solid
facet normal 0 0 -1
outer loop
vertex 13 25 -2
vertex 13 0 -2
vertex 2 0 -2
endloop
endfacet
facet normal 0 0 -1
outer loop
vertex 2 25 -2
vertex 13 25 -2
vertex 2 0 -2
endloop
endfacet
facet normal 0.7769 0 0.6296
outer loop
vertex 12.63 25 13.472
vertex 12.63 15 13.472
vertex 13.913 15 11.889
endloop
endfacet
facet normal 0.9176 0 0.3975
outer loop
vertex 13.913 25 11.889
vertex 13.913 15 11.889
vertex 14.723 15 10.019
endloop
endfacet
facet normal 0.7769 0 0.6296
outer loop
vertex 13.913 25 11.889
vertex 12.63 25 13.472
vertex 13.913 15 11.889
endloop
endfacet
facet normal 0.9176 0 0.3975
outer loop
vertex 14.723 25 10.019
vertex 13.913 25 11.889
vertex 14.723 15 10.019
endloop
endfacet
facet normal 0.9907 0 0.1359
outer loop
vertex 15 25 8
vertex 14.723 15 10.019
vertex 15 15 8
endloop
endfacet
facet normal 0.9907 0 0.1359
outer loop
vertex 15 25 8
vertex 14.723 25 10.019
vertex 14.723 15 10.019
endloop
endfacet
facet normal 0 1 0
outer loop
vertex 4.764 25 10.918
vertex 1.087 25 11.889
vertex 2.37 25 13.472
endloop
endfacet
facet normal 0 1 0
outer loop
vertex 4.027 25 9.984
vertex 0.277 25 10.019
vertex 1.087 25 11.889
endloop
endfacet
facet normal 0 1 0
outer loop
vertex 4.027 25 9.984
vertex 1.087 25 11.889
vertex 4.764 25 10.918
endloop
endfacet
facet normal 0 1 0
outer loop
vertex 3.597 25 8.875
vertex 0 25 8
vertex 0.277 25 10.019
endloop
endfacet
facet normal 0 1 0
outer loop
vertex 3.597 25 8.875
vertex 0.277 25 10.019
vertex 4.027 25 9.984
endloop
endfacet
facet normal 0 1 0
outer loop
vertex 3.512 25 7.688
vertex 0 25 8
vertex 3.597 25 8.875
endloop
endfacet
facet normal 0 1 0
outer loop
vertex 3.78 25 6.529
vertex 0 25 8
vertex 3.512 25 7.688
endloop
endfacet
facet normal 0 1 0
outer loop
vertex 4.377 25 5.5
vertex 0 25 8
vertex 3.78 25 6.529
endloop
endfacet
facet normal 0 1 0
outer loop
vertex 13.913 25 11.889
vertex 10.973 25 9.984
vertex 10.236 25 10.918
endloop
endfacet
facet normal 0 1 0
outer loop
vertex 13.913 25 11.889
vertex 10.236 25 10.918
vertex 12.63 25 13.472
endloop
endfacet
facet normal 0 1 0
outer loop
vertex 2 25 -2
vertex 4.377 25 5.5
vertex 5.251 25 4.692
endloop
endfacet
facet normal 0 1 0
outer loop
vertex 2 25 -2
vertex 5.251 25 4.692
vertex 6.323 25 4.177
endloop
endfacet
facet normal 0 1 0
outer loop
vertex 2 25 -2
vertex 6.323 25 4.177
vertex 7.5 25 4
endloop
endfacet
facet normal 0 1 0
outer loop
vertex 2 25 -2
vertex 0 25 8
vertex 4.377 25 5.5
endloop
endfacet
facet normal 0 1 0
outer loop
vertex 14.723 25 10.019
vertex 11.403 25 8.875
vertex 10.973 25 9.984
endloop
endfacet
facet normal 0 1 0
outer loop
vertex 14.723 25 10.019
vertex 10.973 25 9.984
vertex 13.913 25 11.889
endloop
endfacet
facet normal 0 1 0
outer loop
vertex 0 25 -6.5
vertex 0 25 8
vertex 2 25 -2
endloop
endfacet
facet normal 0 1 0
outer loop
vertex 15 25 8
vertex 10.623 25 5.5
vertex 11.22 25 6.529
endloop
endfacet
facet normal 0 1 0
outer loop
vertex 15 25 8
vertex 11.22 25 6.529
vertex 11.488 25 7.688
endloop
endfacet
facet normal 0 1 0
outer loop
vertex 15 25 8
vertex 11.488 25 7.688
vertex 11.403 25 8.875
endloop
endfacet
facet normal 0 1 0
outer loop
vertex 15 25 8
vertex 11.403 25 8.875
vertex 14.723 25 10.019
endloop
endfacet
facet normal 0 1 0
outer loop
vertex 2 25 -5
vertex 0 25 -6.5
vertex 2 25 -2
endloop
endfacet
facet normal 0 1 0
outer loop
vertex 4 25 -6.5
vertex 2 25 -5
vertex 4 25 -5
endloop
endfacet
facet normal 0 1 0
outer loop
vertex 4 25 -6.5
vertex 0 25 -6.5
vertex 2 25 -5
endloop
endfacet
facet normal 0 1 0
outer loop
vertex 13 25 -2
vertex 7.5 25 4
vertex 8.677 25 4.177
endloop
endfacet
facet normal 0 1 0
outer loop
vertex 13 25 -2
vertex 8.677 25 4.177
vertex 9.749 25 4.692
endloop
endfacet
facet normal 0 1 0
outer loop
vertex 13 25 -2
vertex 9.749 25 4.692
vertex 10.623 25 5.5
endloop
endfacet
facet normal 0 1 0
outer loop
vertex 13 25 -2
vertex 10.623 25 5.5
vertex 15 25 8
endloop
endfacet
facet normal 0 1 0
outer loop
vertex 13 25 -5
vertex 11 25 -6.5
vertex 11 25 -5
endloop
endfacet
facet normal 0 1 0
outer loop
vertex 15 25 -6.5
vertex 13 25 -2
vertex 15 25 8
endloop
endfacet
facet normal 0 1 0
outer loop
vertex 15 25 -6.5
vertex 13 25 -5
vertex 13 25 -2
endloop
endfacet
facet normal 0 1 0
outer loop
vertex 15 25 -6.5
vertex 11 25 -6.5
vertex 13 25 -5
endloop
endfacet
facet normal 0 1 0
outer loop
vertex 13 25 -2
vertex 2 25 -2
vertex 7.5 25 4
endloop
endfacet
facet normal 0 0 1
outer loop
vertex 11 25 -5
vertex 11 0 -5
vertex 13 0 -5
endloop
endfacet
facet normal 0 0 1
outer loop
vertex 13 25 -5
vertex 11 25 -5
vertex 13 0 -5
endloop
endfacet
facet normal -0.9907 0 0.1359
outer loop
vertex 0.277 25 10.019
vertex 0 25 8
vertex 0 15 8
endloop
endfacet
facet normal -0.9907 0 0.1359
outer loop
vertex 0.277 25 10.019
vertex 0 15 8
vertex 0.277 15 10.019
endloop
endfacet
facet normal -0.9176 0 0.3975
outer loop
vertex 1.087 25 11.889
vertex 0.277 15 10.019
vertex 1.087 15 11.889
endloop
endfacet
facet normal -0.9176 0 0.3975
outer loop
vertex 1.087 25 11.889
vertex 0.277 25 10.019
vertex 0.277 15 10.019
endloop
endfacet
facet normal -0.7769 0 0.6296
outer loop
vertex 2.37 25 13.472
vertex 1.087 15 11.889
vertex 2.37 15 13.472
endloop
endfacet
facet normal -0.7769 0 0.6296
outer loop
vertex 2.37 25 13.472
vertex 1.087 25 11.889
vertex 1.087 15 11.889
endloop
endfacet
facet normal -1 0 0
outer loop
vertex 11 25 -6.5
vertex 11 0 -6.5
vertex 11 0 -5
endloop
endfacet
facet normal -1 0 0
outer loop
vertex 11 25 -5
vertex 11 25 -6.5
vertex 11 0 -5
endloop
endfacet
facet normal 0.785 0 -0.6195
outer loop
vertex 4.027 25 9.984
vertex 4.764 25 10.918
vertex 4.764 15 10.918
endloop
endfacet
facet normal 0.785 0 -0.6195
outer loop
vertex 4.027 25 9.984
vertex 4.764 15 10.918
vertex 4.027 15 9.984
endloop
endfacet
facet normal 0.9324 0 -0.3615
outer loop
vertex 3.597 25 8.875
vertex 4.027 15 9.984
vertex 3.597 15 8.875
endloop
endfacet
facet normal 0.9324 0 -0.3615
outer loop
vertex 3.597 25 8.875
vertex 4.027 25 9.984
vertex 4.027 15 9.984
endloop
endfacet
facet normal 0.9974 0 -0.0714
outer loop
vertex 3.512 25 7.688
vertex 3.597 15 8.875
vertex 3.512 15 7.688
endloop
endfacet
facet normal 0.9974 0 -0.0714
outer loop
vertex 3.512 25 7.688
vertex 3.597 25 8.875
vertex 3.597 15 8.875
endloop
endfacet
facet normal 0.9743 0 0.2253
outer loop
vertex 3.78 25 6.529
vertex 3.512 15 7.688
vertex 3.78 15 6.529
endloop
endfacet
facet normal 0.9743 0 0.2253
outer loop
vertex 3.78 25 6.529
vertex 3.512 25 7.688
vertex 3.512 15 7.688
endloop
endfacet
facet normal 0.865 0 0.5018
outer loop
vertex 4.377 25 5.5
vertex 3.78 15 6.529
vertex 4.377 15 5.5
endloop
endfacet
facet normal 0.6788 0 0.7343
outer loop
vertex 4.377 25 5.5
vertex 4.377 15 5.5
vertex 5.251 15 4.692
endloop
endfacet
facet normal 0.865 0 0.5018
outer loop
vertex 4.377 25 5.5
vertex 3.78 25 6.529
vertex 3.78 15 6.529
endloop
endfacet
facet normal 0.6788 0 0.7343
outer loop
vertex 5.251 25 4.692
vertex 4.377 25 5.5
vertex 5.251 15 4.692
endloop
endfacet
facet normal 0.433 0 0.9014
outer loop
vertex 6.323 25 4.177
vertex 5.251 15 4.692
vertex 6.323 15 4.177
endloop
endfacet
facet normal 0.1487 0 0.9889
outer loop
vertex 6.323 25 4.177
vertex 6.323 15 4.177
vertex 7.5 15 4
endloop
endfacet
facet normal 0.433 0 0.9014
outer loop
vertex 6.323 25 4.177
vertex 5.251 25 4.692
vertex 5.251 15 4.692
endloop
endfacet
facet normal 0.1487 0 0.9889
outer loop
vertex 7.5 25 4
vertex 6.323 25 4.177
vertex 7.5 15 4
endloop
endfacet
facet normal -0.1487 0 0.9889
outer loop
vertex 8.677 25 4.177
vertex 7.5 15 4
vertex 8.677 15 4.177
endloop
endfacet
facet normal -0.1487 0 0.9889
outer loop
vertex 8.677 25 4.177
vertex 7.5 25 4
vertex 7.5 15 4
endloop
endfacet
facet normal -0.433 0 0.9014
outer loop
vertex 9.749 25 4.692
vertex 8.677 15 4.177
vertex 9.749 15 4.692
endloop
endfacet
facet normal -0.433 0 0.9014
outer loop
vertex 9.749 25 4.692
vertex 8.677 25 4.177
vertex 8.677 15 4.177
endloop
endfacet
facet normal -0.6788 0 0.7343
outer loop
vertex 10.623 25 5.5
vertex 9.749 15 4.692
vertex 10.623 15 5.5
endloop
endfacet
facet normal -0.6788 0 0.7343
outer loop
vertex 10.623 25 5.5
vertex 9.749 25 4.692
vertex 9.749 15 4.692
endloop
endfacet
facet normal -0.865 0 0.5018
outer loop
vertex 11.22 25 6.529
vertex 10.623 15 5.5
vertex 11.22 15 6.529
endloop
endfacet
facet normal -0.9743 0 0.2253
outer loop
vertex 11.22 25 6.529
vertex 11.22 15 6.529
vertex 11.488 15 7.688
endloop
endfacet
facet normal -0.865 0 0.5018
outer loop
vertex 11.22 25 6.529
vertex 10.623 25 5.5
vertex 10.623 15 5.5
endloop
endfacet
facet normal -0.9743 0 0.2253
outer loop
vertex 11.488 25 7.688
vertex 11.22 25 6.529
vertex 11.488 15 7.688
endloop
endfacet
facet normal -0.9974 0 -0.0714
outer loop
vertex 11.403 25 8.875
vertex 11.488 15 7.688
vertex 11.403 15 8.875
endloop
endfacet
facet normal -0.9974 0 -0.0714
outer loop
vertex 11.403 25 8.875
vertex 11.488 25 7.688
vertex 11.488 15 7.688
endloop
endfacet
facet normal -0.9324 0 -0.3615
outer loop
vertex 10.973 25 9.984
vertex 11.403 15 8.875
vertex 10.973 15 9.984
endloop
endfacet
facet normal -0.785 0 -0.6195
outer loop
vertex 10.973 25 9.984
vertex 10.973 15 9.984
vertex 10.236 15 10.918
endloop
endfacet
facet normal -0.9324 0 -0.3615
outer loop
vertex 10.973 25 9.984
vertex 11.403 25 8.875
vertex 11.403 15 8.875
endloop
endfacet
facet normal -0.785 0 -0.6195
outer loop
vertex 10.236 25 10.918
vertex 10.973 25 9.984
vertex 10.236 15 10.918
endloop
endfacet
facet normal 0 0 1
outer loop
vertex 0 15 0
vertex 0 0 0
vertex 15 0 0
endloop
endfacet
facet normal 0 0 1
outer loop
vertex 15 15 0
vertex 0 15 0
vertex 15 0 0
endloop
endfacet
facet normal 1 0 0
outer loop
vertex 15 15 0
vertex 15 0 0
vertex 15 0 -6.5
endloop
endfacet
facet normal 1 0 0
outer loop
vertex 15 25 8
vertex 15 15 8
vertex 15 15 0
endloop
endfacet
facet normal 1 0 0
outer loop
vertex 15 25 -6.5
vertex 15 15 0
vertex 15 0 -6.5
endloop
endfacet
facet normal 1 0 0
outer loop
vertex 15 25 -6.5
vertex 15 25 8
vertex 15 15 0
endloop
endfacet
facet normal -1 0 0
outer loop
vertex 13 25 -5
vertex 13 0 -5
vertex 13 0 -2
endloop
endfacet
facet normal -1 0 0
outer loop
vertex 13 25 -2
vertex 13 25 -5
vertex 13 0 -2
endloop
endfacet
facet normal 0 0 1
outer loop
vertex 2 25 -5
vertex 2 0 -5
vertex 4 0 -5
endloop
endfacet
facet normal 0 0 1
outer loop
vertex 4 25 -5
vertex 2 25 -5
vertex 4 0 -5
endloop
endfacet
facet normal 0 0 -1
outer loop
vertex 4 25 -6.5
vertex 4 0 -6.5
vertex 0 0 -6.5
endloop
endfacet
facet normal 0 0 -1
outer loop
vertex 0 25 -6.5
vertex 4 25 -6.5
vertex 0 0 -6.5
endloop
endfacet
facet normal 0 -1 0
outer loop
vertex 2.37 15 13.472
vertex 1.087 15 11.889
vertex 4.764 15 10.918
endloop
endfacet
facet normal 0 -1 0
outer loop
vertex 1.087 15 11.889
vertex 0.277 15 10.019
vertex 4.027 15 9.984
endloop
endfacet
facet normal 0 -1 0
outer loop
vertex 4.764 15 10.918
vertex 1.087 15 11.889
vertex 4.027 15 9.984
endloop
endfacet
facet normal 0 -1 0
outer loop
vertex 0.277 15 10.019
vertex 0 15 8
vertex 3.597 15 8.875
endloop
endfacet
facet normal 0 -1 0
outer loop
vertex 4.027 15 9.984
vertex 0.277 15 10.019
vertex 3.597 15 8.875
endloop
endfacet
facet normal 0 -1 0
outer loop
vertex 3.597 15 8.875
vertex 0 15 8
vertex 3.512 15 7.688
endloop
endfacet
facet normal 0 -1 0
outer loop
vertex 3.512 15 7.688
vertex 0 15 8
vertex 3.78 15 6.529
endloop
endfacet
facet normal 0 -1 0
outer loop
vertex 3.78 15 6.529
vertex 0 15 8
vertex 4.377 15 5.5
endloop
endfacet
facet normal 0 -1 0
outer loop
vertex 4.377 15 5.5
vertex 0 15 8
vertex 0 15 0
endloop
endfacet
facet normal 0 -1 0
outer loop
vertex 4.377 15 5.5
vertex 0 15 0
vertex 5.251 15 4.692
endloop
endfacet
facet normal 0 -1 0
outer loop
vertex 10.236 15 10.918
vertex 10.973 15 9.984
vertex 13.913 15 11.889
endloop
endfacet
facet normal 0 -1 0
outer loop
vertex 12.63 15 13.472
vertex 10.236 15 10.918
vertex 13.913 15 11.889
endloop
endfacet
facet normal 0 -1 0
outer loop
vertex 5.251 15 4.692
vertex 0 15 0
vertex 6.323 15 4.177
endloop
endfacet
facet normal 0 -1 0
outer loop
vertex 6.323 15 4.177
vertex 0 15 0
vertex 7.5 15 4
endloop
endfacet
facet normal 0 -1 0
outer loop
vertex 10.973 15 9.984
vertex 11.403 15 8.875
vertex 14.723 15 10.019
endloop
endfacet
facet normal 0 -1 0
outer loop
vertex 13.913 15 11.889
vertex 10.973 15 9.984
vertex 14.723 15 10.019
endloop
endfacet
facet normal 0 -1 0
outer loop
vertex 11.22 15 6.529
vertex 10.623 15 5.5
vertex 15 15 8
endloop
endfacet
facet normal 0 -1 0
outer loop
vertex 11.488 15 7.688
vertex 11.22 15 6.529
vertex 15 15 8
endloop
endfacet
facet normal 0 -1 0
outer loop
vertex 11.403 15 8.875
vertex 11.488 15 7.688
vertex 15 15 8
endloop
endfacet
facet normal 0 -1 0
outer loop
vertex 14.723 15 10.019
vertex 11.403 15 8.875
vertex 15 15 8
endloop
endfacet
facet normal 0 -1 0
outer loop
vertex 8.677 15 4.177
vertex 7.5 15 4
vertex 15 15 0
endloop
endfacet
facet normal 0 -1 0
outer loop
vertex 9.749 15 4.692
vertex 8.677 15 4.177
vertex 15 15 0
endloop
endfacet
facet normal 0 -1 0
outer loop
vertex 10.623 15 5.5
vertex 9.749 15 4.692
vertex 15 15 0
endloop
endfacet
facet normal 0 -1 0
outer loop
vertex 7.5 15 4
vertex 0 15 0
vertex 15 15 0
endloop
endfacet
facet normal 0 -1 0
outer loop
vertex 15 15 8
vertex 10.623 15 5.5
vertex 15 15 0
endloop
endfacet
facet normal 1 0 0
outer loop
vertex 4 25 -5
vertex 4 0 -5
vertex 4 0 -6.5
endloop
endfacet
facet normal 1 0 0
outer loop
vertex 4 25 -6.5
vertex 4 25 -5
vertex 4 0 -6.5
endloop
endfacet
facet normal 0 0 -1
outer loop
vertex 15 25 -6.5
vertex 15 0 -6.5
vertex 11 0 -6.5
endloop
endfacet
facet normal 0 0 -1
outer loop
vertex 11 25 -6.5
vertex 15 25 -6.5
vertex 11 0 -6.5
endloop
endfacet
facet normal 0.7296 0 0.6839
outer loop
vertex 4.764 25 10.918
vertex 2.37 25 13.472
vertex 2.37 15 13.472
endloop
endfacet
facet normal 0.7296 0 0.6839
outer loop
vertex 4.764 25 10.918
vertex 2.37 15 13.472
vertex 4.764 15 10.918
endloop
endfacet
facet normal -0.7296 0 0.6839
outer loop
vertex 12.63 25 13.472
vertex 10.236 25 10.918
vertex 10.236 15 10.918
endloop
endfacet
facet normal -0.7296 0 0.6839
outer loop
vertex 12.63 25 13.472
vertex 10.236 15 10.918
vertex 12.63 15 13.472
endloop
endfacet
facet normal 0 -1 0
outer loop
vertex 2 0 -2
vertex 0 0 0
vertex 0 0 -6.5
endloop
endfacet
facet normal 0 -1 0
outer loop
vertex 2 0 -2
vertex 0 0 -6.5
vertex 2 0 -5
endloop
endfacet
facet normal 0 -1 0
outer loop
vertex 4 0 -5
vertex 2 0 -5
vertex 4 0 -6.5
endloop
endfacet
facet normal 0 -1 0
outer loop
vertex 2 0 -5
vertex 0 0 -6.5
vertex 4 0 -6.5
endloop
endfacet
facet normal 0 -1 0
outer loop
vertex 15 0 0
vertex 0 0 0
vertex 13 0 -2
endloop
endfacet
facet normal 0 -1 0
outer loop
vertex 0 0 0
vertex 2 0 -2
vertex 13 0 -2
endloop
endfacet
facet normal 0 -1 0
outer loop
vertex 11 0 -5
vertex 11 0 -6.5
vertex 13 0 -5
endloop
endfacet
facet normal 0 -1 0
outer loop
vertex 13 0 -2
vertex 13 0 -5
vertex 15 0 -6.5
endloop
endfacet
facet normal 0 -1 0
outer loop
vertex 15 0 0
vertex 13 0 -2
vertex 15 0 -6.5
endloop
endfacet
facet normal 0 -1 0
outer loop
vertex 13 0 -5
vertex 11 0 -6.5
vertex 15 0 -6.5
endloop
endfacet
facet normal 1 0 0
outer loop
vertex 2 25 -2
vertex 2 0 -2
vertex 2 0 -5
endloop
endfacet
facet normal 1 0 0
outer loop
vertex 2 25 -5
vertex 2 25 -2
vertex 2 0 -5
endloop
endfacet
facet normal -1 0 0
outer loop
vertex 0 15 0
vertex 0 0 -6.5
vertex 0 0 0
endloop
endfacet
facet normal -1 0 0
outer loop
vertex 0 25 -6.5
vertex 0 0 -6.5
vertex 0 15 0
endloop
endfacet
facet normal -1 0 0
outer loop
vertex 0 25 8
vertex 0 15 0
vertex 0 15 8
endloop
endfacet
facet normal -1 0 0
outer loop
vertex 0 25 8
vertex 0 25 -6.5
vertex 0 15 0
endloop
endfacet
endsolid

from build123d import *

# Parameters (mm, degrees)
BOSS_EXTRUDE2_DEPTH = 25
BOSS_EXTRUDE3_DEPTH = 10


with BuildPart() as part:
    # Sketch1 → Boss-Extrude2 (new body)
    with BuildSketch(Plane(origin=(0, 0, 0), x_dir=(1, 0, 0), z_dir=(0, 1, 0))):
        Polygon((0, 0), (15, 0), (15, 6.5), (11, 6.5), (11, 5), (13, 5), (13, 2), (2, 2), (2, 5), (4, 5), (4, 6.5), (0, 6.5), align=None)
    extrude(amount=BOSS_EXTRUDE2_DEPTH)

    # Sketch2 → Boss-Extrude3 (add)
    with BuildSketch(Plane(origin=(0, 25, 0), x_dir=(1, 0, 0), z_dir=(0, 1, 0))):
        with BuildLine():
            Line((15, -8), (15, 0))
            Line((15, 0), (0, 0))
            Line((0, 0), (0, -8))
            ThreePointArc((0, -8), (0.618078448, -10.981468724), (2.370441533, -13.471529031))
            Line((2.370441533, -13.471529031), (4.764235484, -10.918148817))
            ThreePointArc((4.764235484, -10.918148817), (7.5, -4), (10.235764516, -10.918148817))
            Line((10.235764516, -10.918148817), (12.629558467, -13.471529031))
            ThreePointArc((12.629558467, -13.471529031), (14.381921552, -10.981468724), (15, -8))
        make_face()
    extrude(amount=-BOSS_EXTRUDE3_DEPTH)


solid = part.part
